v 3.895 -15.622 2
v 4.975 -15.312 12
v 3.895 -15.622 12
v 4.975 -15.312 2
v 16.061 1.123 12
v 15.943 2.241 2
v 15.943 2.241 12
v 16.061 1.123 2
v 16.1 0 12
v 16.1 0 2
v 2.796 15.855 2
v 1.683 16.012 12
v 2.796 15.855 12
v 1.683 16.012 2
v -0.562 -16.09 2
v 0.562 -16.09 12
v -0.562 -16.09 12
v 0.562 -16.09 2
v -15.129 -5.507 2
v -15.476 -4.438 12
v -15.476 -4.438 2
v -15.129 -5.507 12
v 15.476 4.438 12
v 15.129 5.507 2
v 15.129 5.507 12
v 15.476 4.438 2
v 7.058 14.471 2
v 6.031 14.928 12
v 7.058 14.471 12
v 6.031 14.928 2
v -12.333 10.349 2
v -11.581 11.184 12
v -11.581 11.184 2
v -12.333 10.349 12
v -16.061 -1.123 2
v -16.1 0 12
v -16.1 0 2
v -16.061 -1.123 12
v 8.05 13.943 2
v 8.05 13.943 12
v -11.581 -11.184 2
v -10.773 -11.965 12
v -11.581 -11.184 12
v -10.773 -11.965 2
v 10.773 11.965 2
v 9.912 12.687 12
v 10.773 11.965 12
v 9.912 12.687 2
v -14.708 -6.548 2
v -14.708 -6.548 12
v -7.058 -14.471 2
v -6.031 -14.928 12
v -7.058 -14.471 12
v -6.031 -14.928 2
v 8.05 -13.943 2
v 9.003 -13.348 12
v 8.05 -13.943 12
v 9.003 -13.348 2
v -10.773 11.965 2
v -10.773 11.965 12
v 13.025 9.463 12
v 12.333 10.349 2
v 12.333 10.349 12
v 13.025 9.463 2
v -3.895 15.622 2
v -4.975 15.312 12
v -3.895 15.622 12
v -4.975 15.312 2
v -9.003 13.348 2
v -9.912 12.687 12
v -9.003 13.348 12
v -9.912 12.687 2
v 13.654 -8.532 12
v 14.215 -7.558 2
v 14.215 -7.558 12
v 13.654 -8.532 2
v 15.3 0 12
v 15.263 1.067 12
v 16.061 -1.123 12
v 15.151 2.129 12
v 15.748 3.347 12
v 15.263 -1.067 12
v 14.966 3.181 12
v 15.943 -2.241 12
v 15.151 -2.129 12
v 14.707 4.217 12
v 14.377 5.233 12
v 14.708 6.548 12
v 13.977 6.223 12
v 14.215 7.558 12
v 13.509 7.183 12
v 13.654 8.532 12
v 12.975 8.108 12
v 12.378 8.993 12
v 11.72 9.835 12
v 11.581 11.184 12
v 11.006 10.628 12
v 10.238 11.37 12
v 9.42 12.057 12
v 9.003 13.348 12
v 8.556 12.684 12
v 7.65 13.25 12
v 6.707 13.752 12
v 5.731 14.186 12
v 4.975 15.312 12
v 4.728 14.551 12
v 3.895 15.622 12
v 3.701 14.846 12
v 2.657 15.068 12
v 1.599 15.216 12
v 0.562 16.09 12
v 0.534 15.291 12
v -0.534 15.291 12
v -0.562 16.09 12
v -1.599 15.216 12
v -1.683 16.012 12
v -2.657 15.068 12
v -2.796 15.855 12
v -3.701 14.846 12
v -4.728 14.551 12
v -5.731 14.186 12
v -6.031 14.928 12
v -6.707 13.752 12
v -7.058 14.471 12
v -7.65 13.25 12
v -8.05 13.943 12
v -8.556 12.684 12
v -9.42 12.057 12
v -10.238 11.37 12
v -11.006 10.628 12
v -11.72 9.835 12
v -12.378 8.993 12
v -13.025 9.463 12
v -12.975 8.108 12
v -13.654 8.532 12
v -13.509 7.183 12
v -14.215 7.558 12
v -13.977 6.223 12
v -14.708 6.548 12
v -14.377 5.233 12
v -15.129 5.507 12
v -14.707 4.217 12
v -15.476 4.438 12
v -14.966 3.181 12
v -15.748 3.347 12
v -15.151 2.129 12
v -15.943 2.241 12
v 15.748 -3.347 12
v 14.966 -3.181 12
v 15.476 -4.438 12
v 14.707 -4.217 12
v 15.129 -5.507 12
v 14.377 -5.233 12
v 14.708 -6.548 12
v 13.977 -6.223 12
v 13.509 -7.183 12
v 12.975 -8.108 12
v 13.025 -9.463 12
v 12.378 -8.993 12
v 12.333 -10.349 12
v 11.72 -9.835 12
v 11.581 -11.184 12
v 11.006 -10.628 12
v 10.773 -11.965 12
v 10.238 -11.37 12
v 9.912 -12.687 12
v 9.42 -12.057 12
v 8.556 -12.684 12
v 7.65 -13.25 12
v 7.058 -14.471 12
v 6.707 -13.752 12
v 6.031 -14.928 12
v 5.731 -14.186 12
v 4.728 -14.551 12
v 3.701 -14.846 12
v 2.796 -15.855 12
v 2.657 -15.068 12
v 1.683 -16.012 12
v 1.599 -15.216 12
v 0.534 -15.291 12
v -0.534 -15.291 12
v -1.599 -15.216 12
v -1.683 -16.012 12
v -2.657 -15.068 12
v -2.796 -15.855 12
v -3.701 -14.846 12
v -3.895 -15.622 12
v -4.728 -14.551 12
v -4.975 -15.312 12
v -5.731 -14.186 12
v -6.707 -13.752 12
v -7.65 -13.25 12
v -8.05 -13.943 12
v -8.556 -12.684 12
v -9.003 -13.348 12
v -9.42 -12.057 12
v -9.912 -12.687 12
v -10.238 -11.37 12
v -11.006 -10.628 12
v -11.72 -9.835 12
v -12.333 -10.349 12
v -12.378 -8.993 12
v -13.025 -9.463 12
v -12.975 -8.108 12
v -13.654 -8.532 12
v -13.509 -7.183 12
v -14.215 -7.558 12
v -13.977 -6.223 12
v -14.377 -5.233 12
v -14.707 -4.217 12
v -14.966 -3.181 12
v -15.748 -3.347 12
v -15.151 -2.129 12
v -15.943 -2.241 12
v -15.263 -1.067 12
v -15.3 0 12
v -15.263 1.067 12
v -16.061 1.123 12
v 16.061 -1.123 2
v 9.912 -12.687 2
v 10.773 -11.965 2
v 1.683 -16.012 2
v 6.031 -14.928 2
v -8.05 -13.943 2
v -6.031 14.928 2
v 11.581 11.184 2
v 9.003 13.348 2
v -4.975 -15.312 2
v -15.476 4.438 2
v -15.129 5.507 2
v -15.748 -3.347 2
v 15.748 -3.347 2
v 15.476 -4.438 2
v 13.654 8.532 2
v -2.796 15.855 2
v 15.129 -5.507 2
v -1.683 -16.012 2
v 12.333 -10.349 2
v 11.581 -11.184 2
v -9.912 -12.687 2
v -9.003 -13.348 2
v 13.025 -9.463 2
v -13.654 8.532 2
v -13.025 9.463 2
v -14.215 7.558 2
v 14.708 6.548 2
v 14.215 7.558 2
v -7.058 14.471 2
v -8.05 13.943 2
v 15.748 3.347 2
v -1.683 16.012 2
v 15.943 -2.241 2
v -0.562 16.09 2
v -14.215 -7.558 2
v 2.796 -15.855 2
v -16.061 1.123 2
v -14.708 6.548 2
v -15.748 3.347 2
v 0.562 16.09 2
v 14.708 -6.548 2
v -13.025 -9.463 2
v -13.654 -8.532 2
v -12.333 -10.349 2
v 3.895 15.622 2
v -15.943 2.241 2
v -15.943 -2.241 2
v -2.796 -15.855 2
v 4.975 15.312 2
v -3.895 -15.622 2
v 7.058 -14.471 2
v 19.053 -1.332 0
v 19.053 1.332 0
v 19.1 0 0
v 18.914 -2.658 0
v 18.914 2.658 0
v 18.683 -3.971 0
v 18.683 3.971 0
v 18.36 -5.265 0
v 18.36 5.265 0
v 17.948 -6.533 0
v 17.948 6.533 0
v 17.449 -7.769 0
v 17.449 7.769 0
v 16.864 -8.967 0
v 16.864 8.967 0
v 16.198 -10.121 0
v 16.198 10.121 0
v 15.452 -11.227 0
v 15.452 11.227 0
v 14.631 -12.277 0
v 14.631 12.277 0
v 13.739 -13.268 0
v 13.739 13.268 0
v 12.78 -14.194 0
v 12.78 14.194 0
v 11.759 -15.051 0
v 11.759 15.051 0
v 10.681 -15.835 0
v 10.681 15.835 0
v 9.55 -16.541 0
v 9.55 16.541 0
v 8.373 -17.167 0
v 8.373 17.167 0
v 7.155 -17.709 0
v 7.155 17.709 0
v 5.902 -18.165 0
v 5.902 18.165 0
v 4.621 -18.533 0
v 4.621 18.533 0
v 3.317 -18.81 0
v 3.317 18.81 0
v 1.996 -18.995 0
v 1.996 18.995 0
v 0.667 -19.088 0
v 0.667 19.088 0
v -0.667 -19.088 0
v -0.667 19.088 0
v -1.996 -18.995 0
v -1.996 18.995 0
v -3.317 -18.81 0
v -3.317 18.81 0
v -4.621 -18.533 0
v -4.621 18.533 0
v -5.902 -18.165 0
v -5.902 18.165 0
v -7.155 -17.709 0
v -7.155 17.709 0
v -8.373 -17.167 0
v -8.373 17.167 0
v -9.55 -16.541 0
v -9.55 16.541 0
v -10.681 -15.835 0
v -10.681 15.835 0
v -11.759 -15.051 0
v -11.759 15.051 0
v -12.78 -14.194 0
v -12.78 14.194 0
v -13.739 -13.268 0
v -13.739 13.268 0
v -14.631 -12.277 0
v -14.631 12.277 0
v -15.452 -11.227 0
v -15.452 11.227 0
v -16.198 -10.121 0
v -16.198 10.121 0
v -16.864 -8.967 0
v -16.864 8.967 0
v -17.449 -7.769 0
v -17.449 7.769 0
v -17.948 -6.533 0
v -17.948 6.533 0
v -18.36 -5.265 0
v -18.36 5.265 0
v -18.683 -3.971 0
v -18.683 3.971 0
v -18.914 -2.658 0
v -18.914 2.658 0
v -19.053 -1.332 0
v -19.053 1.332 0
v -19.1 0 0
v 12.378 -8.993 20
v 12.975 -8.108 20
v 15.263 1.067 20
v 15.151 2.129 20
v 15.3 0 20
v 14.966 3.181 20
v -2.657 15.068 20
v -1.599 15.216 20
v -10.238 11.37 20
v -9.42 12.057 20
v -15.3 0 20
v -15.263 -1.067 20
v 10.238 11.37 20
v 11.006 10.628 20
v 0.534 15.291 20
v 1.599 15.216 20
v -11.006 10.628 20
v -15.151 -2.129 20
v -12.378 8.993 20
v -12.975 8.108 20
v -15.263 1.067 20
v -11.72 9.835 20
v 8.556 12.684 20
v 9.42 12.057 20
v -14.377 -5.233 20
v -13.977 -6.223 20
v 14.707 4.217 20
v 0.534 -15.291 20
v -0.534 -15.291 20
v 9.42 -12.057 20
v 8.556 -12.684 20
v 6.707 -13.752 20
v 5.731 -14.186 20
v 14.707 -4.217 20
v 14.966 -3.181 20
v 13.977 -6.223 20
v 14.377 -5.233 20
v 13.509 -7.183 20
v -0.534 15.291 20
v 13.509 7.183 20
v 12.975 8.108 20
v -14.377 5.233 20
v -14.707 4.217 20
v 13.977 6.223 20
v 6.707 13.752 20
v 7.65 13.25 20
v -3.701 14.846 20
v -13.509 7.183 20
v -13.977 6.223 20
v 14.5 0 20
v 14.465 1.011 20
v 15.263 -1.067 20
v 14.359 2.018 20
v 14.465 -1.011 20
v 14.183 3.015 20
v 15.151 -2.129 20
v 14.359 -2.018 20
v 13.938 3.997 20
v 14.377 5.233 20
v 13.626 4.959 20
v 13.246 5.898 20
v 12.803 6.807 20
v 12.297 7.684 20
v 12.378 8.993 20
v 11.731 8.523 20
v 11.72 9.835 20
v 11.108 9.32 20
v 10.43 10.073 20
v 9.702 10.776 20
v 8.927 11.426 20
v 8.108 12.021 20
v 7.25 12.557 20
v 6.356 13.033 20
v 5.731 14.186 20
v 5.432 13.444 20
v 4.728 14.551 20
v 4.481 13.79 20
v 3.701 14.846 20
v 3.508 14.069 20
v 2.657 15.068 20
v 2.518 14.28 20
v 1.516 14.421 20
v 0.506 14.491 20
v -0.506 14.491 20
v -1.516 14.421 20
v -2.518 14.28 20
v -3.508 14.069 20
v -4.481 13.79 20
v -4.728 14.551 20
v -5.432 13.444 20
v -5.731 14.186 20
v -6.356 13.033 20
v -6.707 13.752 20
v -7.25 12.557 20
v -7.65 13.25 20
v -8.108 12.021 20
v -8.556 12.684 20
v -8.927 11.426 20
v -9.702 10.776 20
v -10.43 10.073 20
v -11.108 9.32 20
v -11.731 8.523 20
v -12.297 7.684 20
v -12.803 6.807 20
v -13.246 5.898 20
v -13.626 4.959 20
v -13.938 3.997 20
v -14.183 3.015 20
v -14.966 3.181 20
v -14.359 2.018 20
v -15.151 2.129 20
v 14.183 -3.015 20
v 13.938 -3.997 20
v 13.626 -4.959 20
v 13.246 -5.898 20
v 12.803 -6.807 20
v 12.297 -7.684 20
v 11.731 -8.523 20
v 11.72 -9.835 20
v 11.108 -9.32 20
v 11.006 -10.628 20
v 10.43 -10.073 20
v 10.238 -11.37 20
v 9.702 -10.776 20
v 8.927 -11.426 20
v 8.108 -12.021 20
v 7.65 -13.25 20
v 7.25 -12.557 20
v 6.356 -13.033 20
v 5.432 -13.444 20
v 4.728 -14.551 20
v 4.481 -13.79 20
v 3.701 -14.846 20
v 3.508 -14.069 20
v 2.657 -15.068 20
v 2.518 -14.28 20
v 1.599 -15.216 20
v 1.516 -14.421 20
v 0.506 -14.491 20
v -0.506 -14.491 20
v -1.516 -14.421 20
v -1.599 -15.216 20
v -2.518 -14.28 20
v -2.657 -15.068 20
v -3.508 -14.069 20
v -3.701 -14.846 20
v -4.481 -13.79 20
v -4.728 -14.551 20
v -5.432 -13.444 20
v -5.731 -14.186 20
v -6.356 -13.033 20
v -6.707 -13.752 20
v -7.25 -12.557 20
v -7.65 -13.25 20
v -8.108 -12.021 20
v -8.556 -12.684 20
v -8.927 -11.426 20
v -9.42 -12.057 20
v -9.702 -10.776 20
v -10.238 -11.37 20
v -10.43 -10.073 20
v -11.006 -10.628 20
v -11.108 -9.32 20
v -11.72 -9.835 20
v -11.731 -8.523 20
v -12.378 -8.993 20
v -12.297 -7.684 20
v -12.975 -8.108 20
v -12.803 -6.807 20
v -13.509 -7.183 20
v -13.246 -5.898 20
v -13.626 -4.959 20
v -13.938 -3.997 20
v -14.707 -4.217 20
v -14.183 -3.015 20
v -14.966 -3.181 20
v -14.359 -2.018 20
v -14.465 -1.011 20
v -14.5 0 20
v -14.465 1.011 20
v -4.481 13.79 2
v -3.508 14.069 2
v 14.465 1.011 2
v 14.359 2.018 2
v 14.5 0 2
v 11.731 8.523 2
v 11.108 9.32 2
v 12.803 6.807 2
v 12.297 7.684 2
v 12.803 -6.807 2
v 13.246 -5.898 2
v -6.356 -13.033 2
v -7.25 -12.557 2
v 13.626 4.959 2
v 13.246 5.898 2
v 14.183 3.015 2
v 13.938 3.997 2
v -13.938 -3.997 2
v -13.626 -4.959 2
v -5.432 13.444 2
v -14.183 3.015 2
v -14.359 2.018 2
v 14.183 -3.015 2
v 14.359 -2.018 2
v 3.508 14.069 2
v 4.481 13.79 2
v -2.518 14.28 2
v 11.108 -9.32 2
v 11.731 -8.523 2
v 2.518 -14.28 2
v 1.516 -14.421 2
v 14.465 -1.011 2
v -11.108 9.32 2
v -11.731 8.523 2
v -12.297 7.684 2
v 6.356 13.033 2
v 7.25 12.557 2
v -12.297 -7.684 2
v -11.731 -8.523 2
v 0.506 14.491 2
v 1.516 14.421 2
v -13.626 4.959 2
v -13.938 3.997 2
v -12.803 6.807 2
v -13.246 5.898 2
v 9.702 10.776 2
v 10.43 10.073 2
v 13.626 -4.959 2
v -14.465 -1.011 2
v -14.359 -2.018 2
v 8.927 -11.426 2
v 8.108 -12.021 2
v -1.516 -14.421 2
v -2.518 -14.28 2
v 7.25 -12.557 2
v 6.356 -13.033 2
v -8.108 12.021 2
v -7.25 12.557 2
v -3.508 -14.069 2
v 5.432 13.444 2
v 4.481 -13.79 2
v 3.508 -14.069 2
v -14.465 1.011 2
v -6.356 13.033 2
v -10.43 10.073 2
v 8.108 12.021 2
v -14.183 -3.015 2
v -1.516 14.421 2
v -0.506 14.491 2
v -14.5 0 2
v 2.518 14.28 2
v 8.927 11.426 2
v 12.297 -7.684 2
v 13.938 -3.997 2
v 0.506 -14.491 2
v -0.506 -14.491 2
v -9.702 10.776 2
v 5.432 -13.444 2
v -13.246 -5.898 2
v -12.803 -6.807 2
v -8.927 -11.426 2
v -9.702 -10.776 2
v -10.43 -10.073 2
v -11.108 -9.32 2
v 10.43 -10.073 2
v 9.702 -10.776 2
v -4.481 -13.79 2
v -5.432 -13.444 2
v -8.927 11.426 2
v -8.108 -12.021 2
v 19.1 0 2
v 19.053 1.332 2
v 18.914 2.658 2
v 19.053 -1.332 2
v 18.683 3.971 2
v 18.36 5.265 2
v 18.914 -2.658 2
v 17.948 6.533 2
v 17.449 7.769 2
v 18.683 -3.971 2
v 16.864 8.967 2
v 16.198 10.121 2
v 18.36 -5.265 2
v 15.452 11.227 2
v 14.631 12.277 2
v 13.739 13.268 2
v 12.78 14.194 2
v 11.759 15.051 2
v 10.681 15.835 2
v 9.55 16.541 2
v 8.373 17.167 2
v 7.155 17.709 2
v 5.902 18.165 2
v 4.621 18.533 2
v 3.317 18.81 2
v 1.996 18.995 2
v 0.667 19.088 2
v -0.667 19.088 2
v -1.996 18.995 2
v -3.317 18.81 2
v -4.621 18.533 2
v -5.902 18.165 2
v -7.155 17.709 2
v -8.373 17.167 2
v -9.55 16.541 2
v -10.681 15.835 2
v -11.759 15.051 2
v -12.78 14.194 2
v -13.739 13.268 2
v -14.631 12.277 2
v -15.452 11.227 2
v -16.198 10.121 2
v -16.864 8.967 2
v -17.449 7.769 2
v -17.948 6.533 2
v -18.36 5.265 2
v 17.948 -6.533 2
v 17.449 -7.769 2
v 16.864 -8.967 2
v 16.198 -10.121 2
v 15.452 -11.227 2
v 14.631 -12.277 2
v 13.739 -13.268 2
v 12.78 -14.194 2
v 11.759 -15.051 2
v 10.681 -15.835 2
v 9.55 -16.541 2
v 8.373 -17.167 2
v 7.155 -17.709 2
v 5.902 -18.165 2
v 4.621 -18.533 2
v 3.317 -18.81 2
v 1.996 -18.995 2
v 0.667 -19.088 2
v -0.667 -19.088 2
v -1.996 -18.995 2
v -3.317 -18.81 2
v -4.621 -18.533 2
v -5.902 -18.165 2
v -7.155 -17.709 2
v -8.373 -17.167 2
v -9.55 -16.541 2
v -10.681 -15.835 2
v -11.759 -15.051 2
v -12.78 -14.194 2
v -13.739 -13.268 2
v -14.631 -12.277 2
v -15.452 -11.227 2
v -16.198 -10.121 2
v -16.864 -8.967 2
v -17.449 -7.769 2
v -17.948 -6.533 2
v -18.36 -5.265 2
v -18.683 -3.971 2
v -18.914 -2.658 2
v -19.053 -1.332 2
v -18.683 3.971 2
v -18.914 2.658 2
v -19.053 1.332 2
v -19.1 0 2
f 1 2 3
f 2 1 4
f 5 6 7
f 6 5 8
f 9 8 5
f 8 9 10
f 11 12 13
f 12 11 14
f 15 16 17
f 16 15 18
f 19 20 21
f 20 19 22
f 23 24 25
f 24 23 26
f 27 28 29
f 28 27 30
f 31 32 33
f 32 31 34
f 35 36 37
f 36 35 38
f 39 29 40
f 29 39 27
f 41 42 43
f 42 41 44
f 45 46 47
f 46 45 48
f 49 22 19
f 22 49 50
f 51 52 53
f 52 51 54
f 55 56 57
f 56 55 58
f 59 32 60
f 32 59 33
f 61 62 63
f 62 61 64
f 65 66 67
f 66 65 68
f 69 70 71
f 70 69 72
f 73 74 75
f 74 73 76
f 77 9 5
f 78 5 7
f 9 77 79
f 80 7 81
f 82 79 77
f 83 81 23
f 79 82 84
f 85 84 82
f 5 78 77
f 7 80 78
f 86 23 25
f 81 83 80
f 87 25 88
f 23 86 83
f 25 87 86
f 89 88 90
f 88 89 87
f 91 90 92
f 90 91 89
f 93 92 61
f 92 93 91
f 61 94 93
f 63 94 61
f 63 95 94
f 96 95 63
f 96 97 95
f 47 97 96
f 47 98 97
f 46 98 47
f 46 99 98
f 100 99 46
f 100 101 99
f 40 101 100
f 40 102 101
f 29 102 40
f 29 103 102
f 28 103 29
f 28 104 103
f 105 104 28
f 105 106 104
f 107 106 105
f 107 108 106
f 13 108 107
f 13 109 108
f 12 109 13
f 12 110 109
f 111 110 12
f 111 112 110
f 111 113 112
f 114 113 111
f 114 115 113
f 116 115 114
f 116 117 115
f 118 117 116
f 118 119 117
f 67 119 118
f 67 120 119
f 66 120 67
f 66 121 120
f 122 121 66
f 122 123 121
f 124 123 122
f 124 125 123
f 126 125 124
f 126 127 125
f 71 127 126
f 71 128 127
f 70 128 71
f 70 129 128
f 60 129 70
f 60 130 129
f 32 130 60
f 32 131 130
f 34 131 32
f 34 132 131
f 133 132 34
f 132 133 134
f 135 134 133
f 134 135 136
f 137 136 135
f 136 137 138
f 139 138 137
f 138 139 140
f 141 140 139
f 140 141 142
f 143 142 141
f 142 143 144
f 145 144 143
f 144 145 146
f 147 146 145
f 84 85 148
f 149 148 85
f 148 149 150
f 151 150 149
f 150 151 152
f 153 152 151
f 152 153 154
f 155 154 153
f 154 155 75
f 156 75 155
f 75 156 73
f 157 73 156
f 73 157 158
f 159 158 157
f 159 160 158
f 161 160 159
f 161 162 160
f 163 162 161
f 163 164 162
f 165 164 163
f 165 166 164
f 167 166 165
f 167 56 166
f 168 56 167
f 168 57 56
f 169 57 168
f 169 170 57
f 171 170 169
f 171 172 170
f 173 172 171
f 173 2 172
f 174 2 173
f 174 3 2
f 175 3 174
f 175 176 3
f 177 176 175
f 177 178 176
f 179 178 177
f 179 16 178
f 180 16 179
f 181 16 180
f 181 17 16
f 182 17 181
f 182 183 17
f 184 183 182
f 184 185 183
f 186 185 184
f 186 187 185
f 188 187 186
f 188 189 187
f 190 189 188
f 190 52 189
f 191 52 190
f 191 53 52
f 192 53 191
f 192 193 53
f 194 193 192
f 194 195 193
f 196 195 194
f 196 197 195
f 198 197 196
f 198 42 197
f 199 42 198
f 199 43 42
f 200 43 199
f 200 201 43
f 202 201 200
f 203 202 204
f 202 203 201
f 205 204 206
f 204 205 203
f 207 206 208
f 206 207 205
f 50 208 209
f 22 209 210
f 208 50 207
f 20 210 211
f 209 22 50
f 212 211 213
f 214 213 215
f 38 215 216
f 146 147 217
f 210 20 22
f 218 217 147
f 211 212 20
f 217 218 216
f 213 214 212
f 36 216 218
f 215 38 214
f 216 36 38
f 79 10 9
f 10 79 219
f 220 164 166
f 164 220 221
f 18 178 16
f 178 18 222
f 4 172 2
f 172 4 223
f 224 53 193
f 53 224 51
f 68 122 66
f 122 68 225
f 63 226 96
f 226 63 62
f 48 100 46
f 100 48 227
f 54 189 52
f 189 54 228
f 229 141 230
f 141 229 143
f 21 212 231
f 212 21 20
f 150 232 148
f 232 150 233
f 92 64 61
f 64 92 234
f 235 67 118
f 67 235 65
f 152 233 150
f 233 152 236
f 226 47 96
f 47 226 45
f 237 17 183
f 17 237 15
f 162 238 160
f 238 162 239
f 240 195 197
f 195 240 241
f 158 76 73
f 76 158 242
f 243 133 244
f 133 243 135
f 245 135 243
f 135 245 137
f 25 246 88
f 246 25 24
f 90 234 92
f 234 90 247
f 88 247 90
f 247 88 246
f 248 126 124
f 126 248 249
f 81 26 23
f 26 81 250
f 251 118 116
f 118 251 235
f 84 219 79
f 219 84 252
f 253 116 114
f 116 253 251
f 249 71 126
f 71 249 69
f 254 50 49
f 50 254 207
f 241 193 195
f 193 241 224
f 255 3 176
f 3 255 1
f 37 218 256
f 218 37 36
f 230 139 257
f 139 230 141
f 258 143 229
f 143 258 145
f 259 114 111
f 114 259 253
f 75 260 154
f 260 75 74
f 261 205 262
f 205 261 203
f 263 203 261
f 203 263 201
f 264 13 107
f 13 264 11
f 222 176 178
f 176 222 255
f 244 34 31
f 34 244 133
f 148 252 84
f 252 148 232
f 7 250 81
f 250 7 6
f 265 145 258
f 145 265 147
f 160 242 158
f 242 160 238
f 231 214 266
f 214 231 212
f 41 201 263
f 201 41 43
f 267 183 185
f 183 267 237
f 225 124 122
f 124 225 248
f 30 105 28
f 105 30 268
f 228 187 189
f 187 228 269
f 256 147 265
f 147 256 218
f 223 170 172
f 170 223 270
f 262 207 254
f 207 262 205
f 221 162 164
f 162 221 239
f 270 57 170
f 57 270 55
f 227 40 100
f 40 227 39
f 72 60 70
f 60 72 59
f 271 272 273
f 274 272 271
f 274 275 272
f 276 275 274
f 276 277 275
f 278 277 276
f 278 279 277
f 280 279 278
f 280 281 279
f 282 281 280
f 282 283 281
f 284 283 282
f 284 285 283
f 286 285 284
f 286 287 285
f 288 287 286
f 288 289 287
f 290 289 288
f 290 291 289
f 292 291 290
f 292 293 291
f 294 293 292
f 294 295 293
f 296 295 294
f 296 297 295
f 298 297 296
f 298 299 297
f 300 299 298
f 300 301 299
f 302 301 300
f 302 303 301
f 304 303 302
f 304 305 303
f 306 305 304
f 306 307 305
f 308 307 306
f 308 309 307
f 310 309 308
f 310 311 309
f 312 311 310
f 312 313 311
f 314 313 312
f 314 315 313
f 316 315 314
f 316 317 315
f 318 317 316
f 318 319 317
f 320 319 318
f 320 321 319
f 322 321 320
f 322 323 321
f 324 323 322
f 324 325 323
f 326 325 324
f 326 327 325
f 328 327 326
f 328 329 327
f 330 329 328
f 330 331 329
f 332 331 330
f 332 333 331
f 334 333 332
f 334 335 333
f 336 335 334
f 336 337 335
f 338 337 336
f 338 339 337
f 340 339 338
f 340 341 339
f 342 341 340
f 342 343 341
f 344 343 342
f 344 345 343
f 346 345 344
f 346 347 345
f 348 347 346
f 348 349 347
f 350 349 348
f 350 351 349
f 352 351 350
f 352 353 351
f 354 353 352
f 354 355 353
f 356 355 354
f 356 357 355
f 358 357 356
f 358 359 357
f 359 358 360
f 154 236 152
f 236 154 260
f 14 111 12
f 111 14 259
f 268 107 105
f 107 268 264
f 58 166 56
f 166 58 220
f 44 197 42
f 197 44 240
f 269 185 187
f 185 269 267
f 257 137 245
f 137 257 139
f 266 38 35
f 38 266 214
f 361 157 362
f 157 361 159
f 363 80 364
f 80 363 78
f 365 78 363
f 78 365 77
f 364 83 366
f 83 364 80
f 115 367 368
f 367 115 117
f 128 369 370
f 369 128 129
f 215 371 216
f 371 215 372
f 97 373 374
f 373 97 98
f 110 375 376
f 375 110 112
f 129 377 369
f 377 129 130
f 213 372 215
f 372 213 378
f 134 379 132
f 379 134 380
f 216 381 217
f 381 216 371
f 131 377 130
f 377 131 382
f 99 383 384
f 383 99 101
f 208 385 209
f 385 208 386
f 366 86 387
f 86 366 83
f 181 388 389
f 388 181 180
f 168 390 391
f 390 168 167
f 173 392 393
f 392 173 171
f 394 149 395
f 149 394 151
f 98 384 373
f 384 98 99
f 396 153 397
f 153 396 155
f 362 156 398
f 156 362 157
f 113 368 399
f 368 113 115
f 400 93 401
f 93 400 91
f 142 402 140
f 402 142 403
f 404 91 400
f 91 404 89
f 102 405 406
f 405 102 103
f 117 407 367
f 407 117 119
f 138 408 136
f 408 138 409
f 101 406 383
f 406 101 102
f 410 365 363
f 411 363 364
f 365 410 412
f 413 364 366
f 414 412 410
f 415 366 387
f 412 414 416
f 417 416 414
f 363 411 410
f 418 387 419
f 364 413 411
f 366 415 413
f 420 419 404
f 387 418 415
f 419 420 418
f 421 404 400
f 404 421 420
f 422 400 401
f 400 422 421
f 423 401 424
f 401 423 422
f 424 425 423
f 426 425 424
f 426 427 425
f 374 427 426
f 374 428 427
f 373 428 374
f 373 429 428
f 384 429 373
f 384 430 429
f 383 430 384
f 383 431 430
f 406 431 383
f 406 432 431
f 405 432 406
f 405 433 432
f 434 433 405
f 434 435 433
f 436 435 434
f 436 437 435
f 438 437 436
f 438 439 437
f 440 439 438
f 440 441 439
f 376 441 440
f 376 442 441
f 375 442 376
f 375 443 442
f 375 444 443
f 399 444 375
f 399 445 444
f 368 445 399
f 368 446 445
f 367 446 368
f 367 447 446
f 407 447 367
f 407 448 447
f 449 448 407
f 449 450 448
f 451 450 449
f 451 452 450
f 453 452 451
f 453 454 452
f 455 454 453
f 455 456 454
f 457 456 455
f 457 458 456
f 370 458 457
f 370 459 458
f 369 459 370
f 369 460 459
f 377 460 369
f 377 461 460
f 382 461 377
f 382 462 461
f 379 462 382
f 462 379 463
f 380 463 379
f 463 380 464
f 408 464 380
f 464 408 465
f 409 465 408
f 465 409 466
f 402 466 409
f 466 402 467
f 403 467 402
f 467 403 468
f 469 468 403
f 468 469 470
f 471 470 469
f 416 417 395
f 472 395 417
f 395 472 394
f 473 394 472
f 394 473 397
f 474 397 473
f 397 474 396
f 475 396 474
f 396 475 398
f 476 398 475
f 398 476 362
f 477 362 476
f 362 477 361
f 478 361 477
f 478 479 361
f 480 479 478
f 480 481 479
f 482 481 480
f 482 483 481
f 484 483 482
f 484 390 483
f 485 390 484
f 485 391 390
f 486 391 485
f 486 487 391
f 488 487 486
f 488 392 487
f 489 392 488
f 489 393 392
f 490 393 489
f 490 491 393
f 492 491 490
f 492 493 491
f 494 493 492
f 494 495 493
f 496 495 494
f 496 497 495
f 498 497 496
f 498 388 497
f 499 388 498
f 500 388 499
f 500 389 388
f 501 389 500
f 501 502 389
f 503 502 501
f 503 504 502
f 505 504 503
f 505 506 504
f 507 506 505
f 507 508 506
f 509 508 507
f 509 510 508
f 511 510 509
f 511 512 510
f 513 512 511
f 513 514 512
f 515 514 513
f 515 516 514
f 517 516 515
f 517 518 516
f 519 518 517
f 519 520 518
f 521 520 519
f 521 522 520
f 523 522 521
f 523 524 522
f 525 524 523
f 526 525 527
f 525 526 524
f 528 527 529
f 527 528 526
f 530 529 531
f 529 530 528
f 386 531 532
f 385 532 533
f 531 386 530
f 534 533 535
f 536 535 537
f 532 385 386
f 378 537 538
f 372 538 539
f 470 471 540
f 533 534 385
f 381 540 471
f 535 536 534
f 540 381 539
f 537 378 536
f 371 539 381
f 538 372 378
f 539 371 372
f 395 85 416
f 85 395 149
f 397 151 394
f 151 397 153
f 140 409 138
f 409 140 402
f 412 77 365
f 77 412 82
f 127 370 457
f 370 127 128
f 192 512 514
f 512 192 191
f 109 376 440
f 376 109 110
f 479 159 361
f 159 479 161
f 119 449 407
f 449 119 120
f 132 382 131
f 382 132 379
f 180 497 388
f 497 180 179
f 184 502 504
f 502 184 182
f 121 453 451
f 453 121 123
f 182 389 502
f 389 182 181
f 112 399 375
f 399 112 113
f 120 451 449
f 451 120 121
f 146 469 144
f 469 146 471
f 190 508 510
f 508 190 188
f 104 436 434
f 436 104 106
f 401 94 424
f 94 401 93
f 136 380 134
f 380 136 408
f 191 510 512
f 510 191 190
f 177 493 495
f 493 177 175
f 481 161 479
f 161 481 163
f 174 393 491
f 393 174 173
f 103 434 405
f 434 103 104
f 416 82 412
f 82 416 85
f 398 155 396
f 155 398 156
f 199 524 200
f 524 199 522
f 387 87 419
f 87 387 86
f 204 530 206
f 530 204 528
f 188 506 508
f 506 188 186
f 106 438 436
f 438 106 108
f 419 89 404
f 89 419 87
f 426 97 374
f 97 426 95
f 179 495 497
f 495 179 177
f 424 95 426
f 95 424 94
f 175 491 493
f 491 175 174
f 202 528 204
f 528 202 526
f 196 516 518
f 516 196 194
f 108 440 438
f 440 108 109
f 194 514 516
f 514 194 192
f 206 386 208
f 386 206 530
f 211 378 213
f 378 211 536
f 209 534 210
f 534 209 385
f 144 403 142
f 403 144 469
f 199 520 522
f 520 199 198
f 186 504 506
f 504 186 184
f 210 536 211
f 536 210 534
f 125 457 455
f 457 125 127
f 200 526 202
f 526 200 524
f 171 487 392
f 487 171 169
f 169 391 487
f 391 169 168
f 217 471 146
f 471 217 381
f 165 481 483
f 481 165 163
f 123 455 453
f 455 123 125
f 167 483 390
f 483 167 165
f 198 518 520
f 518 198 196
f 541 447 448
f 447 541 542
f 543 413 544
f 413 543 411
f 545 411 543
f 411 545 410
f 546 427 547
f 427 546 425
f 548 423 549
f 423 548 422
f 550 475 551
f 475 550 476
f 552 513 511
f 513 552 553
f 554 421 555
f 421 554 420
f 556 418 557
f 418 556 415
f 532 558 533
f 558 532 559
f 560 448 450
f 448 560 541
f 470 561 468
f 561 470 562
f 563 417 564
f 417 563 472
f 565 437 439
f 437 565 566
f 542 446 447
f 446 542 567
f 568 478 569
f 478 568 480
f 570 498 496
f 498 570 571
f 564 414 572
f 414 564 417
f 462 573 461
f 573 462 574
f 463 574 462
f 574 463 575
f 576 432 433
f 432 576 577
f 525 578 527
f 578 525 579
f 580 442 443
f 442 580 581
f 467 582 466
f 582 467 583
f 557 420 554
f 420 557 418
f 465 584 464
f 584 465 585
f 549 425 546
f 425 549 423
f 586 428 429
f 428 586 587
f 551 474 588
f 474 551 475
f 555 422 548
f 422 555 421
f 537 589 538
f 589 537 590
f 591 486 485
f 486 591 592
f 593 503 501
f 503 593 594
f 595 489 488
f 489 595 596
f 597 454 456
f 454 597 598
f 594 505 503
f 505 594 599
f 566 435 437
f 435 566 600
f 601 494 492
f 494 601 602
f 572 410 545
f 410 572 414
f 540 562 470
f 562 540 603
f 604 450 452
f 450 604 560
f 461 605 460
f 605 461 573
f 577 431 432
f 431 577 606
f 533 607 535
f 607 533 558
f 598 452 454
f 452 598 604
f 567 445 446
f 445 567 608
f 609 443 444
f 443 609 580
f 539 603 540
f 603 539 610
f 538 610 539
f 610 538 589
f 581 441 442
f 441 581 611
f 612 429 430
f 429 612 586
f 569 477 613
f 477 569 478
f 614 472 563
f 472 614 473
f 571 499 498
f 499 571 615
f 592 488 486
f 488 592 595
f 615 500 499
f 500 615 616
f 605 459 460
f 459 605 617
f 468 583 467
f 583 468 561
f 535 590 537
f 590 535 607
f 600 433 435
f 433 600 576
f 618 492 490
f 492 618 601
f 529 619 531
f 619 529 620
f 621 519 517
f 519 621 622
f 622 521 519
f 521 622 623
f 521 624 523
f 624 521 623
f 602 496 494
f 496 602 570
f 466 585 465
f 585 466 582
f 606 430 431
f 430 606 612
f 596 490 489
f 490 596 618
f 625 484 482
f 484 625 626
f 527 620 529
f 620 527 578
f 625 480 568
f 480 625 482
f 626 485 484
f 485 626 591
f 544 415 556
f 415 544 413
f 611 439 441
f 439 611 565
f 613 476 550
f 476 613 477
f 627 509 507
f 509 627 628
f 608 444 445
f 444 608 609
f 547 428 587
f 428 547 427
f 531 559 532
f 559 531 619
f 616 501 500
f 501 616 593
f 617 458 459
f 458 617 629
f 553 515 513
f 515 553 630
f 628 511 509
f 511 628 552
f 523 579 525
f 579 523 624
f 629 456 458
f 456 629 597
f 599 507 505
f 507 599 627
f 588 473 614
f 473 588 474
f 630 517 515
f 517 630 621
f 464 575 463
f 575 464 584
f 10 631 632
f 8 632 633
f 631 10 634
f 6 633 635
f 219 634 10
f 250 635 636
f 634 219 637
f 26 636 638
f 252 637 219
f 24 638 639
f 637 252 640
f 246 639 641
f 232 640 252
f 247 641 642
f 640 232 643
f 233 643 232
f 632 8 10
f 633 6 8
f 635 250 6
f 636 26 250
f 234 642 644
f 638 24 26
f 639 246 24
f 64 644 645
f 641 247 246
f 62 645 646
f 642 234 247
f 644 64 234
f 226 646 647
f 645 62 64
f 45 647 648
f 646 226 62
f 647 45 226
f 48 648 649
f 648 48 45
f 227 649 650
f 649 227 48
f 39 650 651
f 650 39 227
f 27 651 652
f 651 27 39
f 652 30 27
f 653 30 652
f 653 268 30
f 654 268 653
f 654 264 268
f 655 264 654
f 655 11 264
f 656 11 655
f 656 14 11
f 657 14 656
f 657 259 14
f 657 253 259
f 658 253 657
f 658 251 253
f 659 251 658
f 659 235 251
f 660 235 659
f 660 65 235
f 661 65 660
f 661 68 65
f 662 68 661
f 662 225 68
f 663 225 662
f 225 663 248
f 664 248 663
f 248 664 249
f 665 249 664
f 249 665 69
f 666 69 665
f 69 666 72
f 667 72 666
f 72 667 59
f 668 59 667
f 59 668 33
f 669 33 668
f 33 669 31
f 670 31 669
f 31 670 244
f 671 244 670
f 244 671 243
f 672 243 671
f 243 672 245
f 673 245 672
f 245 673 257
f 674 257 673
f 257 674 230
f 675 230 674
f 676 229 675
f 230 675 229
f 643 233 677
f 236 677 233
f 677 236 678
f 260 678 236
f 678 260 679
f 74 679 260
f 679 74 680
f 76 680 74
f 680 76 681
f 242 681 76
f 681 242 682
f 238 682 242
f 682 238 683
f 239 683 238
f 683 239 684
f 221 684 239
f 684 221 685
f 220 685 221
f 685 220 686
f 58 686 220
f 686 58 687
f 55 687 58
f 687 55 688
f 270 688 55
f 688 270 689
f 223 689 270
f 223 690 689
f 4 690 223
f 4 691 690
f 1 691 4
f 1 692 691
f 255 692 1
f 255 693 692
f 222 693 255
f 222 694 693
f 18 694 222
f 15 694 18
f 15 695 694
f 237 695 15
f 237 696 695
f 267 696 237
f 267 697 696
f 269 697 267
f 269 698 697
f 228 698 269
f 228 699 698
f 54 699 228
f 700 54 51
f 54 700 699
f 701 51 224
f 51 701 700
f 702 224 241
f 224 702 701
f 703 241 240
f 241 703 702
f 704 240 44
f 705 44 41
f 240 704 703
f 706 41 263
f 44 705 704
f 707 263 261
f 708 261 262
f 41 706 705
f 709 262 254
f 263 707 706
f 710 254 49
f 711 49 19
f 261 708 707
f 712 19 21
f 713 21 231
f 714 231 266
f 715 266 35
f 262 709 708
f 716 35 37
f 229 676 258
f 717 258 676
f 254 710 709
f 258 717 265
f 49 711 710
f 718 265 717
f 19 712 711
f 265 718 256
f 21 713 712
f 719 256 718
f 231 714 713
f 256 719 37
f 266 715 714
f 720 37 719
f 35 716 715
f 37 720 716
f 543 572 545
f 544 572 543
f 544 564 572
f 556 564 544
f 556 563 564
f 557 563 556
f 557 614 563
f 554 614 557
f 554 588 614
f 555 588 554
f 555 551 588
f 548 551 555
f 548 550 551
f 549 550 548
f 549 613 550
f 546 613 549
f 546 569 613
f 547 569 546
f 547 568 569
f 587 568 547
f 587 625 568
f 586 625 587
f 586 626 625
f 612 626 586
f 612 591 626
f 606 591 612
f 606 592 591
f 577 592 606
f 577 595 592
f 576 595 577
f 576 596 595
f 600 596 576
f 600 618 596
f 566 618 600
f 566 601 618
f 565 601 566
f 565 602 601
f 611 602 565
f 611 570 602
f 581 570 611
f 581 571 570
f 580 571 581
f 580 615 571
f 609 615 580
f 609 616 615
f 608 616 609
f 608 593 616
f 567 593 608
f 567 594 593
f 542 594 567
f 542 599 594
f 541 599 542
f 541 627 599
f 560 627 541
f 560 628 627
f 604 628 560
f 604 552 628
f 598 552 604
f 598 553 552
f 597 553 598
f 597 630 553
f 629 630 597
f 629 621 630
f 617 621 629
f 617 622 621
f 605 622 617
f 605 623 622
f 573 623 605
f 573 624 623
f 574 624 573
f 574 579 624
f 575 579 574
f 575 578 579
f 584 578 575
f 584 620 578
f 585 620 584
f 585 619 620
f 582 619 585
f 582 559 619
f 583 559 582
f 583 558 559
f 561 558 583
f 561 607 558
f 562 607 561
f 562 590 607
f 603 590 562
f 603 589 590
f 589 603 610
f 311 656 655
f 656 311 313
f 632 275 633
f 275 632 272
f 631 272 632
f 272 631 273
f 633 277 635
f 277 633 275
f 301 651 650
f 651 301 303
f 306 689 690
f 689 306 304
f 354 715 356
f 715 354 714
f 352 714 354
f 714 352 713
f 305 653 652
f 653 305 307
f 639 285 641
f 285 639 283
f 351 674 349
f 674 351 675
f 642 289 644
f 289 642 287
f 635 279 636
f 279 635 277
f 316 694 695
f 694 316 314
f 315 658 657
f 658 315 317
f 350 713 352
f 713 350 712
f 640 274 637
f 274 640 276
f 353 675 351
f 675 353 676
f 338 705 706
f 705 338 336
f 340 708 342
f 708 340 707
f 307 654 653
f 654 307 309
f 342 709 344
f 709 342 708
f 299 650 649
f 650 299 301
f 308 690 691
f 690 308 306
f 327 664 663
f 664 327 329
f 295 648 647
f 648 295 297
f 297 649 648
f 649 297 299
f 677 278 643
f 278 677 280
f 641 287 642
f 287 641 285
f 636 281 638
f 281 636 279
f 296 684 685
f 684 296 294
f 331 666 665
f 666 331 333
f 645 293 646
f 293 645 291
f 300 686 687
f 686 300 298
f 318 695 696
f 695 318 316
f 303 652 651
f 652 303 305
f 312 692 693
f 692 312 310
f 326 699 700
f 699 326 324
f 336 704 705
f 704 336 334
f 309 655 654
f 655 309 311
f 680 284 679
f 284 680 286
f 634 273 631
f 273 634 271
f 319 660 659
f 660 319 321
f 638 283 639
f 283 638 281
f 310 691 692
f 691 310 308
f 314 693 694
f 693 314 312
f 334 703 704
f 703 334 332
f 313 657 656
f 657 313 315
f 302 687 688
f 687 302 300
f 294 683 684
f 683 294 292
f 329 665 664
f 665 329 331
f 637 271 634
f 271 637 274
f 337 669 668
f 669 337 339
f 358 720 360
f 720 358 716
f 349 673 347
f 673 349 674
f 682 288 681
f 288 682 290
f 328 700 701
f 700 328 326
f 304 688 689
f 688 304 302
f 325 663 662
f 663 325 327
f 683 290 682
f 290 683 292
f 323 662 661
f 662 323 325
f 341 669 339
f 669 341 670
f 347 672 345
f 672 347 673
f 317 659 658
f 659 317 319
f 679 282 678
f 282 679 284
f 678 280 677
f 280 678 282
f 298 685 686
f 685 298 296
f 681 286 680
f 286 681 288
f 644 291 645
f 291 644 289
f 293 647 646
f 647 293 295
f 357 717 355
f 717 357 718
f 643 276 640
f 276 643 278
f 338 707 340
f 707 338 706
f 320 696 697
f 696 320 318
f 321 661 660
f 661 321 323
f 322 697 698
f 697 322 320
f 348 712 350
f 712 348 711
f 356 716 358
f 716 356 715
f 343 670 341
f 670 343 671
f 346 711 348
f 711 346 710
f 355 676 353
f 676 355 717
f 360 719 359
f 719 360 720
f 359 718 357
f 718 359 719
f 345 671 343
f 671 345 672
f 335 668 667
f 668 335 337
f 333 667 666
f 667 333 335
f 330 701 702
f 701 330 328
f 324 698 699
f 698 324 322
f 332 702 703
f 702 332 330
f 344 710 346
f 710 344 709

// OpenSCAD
$fn=90;

h=18;

h1=9;
h2=6;
h3=2;

d=29;

nozzleD=0.4;
wall=nozzleD*4;

cap(d, wall, h3, h);

module cap(d1, wallThickness, h1, h2) {
    difference() {
        cylinderAngled(d=d1,h=h1+h2, wall=wallThickness);
        translate([0,0,h1]) cylinder(d=d1,h=h2);
    }
    cylinder(d=d+h1*3+wallThickness*2,h=h1);
}

module cylinderAngled(d,h,wall){
    h1=h*0.6;
    h2=h-h1;
    cylinder(d=d+wall*2,h=h1);
    translate([0,0,h1]) cylinder(d=d+wall,h=h2);
}
